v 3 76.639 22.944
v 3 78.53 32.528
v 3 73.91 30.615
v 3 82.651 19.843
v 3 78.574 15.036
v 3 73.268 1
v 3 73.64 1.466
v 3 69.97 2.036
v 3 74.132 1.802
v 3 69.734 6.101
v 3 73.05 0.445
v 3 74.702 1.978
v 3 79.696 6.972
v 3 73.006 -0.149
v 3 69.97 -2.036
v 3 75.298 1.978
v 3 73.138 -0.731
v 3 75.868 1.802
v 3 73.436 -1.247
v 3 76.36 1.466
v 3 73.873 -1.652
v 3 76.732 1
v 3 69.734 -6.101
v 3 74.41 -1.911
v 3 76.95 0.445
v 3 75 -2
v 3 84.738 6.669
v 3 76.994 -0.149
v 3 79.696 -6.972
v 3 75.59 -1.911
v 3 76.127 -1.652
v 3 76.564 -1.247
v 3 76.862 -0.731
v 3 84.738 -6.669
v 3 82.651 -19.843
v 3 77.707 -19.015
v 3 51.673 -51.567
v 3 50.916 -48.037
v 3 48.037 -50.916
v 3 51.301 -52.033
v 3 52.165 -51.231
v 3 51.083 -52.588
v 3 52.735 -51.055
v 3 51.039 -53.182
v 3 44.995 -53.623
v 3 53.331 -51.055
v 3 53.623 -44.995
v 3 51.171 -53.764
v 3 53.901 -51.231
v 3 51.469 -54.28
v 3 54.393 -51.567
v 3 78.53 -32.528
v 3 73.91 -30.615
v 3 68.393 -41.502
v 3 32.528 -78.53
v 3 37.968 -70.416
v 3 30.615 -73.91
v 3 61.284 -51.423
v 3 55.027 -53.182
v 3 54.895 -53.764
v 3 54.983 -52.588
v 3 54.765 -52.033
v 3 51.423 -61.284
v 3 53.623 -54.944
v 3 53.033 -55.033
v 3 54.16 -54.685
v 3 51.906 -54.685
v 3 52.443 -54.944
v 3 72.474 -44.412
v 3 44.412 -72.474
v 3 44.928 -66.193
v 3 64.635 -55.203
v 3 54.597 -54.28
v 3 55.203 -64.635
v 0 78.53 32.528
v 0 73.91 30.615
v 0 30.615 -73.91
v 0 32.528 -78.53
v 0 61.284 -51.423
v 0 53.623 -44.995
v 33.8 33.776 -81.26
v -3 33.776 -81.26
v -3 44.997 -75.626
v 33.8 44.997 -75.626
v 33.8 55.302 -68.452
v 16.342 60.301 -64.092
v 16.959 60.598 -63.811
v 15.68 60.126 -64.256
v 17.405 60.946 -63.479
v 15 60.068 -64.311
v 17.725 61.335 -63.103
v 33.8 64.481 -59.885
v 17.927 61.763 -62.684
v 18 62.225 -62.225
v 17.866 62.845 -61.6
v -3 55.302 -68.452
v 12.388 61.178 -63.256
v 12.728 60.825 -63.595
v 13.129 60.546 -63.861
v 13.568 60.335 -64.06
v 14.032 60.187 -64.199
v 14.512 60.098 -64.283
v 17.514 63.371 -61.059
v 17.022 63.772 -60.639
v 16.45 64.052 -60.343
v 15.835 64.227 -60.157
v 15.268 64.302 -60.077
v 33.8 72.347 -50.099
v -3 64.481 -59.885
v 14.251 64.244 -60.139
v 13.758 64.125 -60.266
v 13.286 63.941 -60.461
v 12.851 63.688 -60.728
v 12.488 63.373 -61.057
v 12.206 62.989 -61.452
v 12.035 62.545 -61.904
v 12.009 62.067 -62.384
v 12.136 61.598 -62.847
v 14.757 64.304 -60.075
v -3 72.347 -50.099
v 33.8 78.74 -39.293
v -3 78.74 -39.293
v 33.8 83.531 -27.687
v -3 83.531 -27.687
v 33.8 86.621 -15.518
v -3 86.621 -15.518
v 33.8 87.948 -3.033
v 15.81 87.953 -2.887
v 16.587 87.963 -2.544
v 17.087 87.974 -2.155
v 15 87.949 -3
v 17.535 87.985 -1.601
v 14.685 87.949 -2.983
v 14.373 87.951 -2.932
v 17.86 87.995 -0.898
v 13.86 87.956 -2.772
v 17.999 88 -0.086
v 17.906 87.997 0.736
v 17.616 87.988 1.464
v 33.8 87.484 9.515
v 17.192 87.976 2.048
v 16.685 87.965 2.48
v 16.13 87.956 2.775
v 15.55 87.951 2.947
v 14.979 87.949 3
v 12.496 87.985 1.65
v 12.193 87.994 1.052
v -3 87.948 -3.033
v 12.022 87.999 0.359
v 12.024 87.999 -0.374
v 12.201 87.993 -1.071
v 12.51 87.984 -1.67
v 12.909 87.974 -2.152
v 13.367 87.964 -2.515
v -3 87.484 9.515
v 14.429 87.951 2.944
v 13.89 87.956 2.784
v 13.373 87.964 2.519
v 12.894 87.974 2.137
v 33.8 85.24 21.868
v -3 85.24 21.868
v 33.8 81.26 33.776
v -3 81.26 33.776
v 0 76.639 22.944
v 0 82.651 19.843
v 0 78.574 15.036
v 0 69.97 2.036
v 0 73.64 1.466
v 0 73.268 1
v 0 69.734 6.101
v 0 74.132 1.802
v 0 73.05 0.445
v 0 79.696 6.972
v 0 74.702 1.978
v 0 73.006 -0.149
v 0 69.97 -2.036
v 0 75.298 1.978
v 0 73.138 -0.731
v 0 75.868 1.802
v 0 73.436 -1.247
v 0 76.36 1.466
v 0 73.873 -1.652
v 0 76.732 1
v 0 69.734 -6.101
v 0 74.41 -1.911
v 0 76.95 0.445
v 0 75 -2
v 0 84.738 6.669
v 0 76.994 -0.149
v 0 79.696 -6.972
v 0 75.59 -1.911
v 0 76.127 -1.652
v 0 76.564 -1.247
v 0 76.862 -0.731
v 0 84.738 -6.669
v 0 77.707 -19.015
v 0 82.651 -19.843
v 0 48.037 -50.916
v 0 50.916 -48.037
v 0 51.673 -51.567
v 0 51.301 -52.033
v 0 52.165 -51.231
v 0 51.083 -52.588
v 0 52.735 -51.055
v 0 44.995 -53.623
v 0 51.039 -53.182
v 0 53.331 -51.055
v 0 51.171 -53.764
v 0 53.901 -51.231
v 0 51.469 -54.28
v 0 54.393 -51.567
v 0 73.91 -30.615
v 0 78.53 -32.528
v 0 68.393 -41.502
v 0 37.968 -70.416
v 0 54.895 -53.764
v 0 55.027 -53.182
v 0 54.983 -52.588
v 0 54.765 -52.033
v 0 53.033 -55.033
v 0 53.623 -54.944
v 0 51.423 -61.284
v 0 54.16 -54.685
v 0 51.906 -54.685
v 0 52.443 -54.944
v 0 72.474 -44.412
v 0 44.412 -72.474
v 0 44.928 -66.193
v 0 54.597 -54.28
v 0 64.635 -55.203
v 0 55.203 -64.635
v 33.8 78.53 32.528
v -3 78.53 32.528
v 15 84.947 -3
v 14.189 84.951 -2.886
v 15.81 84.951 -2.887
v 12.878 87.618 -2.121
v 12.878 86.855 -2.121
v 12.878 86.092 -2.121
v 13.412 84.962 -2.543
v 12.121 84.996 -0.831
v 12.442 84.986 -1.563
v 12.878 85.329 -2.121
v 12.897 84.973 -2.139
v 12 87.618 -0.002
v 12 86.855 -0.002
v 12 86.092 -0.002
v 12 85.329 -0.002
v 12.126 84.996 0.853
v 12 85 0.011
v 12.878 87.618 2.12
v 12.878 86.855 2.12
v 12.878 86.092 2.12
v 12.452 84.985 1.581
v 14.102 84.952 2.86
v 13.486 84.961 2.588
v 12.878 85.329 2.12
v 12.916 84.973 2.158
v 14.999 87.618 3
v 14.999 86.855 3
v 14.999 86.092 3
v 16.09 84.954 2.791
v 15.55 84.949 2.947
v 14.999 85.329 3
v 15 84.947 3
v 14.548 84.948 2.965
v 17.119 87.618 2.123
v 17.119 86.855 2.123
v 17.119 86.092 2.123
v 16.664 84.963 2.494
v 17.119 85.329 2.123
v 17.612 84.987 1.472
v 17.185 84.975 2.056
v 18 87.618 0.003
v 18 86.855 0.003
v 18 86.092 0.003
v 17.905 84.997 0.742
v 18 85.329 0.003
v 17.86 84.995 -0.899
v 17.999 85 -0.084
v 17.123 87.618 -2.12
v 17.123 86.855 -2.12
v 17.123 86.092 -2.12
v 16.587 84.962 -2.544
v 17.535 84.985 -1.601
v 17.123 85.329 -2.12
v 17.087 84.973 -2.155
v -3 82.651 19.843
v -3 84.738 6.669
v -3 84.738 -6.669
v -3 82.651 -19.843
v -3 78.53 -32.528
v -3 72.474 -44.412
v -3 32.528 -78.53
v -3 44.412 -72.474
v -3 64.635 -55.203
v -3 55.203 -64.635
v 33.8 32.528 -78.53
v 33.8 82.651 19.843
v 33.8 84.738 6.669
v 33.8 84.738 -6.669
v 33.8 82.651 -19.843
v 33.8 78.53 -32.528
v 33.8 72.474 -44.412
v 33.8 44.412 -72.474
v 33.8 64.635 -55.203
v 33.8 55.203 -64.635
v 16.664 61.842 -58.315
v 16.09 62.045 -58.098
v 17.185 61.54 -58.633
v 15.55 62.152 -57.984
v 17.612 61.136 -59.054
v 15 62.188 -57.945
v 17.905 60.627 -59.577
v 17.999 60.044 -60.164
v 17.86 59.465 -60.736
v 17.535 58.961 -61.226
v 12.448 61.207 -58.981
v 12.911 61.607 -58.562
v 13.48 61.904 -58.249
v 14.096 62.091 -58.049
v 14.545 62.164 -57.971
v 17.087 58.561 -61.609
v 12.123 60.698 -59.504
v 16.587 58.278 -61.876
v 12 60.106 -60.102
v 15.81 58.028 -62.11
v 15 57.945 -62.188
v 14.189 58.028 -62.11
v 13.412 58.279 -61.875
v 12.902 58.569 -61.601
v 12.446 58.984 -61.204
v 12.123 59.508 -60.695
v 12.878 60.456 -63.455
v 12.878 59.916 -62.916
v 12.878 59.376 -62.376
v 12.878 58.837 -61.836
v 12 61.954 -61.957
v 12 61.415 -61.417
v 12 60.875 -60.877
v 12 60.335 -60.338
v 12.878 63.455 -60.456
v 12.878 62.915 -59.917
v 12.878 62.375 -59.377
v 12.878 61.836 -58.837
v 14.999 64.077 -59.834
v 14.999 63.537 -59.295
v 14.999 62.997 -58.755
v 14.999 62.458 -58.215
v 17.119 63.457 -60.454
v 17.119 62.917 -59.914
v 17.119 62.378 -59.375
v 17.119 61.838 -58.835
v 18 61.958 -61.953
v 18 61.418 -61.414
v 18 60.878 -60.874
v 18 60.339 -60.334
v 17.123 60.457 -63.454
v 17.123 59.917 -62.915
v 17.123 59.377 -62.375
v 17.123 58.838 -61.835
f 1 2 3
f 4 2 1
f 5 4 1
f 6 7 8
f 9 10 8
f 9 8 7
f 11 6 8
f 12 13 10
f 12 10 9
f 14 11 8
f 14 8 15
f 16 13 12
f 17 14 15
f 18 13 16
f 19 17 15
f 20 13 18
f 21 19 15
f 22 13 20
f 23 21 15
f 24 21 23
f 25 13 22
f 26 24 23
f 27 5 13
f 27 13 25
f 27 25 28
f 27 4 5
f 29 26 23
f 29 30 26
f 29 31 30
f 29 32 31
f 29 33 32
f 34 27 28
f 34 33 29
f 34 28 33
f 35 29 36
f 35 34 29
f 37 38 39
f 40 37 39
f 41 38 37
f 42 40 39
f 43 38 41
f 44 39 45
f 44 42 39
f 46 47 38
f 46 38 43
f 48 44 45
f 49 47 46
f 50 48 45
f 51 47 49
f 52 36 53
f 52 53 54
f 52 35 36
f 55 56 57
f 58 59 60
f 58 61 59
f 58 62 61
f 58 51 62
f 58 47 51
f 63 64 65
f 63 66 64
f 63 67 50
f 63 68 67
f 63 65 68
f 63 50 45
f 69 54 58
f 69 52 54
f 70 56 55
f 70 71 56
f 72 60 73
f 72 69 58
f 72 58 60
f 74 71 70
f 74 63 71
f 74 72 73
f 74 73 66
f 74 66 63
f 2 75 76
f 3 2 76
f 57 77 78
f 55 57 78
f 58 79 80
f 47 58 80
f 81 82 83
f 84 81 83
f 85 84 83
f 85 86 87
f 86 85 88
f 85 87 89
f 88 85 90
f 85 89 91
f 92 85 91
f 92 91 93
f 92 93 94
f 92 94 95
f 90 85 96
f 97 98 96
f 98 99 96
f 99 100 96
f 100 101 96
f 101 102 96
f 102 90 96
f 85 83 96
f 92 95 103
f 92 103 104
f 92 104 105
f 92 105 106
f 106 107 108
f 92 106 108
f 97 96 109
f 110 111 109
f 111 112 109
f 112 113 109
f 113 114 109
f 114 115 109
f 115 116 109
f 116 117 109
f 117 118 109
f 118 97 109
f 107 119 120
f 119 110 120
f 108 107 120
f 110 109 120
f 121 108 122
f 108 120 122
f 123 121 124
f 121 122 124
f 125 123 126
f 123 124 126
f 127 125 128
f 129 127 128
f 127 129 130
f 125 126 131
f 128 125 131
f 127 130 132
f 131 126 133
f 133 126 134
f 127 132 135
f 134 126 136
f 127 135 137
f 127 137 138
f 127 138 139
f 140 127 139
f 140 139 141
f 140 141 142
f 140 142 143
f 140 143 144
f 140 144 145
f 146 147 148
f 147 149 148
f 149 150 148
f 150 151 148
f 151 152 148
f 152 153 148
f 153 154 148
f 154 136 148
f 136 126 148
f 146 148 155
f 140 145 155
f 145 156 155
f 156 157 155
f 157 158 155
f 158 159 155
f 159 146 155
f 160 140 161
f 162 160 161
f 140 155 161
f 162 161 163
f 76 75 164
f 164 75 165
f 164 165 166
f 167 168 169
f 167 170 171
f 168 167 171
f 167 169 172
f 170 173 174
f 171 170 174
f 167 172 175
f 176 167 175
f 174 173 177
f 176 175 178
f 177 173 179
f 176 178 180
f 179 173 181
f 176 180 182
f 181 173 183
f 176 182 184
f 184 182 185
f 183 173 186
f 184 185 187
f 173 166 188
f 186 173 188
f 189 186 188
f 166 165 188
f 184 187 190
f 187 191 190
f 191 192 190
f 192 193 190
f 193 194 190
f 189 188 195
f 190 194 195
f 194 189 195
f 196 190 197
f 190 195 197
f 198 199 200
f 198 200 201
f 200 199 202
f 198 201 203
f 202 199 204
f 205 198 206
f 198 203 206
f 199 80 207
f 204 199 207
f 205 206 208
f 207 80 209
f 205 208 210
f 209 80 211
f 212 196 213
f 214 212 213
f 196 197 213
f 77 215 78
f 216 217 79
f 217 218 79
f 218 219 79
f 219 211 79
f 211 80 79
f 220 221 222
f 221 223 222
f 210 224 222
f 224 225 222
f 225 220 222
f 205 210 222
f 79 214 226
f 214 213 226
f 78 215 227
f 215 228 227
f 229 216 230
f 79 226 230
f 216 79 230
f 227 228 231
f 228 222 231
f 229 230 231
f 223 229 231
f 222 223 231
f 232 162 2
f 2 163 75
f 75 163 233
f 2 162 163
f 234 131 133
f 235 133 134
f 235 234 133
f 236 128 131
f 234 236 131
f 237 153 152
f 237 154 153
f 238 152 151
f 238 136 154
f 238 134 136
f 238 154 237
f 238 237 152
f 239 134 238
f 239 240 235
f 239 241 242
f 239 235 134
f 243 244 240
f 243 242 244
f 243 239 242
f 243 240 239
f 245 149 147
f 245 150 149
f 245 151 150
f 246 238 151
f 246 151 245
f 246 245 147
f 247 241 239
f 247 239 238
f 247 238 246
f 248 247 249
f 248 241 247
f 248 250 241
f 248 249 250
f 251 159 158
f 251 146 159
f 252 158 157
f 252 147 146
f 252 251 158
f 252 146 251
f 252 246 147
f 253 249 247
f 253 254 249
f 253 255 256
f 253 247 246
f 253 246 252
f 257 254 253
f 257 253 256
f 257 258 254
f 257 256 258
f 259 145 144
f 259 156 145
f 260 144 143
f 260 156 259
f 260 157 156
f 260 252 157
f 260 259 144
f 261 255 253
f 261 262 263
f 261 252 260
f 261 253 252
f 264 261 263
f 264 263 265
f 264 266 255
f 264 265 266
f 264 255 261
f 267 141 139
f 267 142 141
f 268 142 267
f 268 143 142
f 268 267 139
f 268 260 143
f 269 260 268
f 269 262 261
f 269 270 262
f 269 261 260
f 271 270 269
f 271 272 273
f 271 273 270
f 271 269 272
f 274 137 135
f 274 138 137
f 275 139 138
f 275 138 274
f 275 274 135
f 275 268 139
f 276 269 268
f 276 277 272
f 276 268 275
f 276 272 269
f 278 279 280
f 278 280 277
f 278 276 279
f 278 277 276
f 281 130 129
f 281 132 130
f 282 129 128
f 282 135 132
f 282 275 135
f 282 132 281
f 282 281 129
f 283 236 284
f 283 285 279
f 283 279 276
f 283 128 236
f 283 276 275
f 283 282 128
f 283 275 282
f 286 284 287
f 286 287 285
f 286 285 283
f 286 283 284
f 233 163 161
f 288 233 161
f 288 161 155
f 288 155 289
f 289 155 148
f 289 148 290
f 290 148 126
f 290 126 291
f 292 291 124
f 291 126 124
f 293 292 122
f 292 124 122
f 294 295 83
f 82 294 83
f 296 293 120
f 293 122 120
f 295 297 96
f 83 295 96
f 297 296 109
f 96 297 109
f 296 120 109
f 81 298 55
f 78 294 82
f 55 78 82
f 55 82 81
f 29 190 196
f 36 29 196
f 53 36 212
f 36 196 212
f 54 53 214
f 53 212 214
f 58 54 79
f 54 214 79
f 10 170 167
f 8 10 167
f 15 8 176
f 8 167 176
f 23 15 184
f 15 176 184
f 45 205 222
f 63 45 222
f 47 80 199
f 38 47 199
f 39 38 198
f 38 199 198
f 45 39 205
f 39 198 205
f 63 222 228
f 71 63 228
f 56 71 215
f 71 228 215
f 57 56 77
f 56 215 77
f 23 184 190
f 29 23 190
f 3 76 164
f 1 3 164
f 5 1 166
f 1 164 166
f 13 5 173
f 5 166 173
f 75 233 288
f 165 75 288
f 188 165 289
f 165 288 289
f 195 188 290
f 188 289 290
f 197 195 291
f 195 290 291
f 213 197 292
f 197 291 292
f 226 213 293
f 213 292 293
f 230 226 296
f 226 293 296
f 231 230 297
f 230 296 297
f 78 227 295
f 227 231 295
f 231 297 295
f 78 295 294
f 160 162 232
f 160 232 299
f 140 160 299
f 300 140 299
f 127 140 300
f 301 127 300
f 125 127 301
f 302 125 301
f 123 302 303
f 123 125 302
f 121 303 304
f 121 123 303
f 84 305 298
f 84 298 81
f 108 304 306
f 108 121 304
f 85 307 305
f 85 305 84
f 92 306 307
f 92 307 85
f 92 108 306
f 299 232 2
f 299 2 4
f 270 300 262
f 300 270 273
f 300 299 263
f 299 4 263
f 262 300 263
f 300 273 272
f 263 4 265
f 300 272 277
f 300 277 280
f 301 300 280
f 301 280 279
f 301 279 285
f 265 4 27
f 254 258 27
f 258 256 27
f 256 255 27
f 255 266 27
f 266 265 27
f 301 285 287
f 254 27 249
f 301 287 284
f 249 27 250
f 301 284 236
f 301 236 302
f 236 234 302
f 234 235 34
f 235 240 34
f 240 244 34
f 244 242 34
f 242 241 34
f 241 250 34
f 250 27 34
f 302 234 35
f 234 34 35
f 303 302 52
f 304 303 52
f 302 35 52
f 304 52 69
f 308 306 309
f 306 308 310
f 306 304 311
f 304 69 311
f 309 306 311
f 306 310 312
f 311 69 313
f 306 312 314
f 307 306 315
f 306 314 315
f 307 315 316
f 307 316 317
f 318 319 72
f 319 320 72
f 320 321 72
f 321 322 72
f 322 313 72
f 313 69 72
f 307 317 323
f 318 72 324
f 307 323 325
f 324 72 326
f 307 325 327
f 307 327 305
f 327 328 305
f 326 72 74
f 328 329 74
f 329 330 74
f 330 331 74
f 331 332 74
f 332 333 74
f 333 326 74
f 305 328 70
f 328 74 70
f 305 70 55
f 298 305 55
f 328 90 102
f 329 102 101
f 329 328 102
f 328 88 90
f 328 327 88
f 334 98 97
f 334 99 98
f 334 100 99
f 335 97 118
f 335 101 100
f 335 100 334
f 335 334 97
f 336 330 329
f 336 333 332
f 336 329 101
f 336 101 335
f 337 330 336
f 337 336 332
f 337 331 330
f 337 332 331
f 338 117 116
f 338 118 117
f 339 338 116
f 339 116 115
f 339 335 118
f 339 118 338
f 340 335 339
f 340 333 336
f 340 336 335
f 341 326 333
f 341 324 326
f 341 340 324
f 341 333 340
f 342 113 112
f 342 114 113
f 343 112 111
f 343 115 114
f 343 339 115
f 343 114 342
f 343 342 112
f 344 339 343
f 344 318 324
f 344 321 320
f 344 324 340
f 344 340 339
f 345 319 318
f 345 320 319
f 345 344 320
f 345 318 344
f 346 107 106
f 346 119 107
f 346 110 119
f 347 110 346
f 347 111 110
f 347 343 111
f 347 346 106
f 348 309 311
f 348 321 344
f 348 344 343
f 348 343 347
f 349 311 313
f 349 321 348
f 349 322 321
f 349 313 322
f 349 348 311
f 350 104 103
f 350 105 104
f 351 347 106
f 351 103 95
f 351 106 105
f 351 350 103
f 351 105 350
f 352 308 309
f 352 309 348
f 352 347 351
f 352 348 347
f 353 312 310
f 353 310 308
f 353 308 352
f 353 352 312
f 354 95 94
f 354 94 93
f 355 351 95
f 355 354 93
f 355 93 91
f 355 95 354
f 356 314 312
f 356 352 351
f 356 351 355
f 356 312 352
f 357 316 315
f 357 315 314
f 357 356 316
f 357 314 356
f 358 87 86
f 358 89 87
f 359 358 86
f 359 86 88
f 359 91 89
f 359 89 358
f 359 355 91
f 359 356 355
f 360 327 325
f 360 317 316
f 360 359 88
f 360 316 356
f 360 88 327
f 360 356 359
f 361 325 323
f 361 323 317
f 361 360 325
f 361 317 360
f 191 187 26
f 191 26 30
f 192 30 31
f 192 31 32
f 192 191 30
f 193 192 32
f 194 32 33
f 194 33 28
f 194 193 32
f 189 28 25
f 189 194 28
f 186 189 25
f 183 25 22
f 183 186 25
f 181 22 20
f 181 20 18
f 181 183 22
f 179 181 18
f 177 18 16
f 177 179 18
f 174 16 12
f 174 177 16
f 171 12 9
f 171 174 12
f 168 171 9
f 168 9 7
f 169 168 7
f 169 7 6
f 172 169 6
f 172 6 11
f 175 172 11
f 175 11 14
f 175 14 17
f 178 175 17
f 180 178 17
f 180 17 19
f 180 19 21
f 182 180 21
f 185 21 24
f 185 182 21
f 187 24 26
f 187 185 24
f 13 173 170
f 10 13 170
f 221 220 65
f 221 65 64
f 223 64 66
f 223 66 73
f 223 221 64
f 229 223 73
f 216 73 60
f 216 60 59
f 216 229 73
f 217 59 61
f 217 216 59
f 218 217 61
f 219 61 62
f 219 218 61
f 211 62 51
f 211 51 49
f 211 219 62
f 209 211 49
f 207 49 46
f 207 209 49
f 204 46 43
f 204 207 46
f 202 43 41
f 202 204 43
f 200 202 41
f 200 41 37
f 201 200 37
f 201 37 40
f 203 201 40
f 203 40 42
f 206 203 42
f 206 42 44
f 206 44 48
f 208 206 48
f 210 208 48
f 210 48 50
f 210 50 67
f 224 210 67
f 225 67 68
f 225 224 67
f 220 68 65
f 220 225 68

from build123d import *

# Parameters (mm, degrees)
SKETCH5_R                = 2
BOSS_EXTRUDE2_DEPTH      = 3
BOSS_EXTRUDE3_DEPTH      = 30.8
BOSS_EXTRUDE3_DEPTH_BACK = 6
CUT_EXTRUDE1_START       = 84.947042212
CUT_EXTRUDE1_DEPTH       = 3.052957992
CIRPATTERN1_COUNT        = 8


# Read off the part's stored shape, not the designer's step: Cut-Extrude1
with BuildPart() as part:
    # Sketch5 → Boss-Extrude2 (new body)
    with BuildSketch(Plane(origin=(0, 0, 0), x_dir=(0, 0, -1), z_dir=(1, 0, 0))):
        with BuildLine():
            Line((-32.528091751, 78.529760263), (-30.614674589, 73.910362601))
            ThreePointArc((-30.614674589, 73.910362601), (-19.014871386, 77.707365585), (-6.97245942, 79.695575847))
            Line((-6.97245942, 79.695575847), (-6.100901992, 69.733628866))
            ThreePointArc((-6.100901992, 69.733628866), (0, 70), (6.100901992, 69.733628866))
            Line((6.100901992, 69.733628866), (6.97245942, 79.695575847))
            ThreePointArc((6.97245942, 79.695575847), (30.614674589, 73.910362601), (51.423008775, 61.28355545))
            Line((51.423008775, 61.28355545), (44.995132678, 53.623111018))
            ThreePointArc((44.995132678, 53.623111018), (49.497474683, 49.497474683), (53.623111018, 44.995132678))
            Line((53.623111018, 44.995132678), (61.28355545, 51.423008775))
            ThreePointArc((61.28355545, 51.423008775), (68.392949654, 41.501860653), (73.910362601, 30.614674589))
            Line((73.910362601, 30.614674589), (78.529760263, 32.528091751))
            ThreePointArc((78.529760263, 32.528091751), (32.528091751, 78.529760263), (-32.528091751, 78.529760263))
        make_face()
        with Locations((0, 75)):
            Circle(SKETCH5_R, mode=Mode.SUBTRACT)
        with Locations((53.033008589, 53.033008589)):
            Circle(SKETCH5_R, mode=Mode.SUBTRACT)
    extrude(amount=BOSS_EXTRUDE2_DEPTH)

    # Sketch6 → Boss-Extrude3 (add, two sides: drawn at the far end of the back side and taken through both)
    with BuildSketch(Plane(origin=(3, 0, 0), x_dir=(0, 0, -1), z_dir=(1, 0, 0)).offset(-BOSS_EXTRUDE3_DEPTH_BACK)):
        with BuildLine():
            Line((-33.776344001, 81.259821474), (-32.528091751, 78.529760263))
            ThreePointArc((-32.528091751, 78.529760263), (32.528091751, 78.529760263), (78.529760263, 32.528091751))
            Line((78.529760263, 32.528091751), (81.259821474, 33.776344001))
            ThreePointArc((81.259821474, 33.776344001), (33.575888915, 81.342852689), (-33.776344001, 81.259821474))
        make_face()
    extrude(amount=BOSS_EXTRUDE3_DEPTH + BOSS_EXTRUDE3_DEPTH_BACK)

    # Cut-Extrude1 outline → Cut-Extrude1 (cut)
    with BuildSketch(Plane(origin=(0, 0, 0), x_dir=(1, 0, 0), z_dir=(0, 1, 0)).offset(CUT_EXTRUDE1_START)):
        with BuildLine():
            add(Edge.make_bspline(
                [(15, 3), (14.207155752, 3), (13.431935871, 2.67467752), (12.32503645, 1.56757614), (12.000417509, 0.784253557), (11.999583343, -0.781056107), (12.317849893, -1.559926049), (13.437373681, -2.680577823), (14.215788964, -2.999721613), (15.78207965, -3.000278008), (16.565523239, -2.676042446), (17.673000882, -1.570710817), (17.999196633, -0.794471212), (18.000800287, 0.788392407), (17.676438527, 1.565317466), (16.569584029, 2.673938655), (15.792844248, 3), (15, 3)],
                knots=[0, 0, 0, 0, 0.125, 0.125, 0.25, 0.25, 0.375, 0.375, 0.5, 0.5, 0.625, 0.625, 0.75, 0.75, 0.875, 0.875, 1, 1, 1, 1], degree=3))
        make_face()
    cut_extrude1 = extrude(amount=CUT_EXTRUDE1_DEPTH, mode=Mode.SUBTRACT)

    # CirPattern1: Cut-Extrude1 ×8 about axis, 6 skipped
    cirpattern1_axis = Axis((0, 0, 0), (1, 0, 0))
    add([cut_extrude1.rotate(cirpattern1_axis, i * 360 / CIRPATTERN1_COUNT) for i in range(1, CIRPATTERN1_COUNT) if i not in (1, 2, 3, 4, 5, 6)], mode=Mode.SUBTRACT)


solid = part.part
